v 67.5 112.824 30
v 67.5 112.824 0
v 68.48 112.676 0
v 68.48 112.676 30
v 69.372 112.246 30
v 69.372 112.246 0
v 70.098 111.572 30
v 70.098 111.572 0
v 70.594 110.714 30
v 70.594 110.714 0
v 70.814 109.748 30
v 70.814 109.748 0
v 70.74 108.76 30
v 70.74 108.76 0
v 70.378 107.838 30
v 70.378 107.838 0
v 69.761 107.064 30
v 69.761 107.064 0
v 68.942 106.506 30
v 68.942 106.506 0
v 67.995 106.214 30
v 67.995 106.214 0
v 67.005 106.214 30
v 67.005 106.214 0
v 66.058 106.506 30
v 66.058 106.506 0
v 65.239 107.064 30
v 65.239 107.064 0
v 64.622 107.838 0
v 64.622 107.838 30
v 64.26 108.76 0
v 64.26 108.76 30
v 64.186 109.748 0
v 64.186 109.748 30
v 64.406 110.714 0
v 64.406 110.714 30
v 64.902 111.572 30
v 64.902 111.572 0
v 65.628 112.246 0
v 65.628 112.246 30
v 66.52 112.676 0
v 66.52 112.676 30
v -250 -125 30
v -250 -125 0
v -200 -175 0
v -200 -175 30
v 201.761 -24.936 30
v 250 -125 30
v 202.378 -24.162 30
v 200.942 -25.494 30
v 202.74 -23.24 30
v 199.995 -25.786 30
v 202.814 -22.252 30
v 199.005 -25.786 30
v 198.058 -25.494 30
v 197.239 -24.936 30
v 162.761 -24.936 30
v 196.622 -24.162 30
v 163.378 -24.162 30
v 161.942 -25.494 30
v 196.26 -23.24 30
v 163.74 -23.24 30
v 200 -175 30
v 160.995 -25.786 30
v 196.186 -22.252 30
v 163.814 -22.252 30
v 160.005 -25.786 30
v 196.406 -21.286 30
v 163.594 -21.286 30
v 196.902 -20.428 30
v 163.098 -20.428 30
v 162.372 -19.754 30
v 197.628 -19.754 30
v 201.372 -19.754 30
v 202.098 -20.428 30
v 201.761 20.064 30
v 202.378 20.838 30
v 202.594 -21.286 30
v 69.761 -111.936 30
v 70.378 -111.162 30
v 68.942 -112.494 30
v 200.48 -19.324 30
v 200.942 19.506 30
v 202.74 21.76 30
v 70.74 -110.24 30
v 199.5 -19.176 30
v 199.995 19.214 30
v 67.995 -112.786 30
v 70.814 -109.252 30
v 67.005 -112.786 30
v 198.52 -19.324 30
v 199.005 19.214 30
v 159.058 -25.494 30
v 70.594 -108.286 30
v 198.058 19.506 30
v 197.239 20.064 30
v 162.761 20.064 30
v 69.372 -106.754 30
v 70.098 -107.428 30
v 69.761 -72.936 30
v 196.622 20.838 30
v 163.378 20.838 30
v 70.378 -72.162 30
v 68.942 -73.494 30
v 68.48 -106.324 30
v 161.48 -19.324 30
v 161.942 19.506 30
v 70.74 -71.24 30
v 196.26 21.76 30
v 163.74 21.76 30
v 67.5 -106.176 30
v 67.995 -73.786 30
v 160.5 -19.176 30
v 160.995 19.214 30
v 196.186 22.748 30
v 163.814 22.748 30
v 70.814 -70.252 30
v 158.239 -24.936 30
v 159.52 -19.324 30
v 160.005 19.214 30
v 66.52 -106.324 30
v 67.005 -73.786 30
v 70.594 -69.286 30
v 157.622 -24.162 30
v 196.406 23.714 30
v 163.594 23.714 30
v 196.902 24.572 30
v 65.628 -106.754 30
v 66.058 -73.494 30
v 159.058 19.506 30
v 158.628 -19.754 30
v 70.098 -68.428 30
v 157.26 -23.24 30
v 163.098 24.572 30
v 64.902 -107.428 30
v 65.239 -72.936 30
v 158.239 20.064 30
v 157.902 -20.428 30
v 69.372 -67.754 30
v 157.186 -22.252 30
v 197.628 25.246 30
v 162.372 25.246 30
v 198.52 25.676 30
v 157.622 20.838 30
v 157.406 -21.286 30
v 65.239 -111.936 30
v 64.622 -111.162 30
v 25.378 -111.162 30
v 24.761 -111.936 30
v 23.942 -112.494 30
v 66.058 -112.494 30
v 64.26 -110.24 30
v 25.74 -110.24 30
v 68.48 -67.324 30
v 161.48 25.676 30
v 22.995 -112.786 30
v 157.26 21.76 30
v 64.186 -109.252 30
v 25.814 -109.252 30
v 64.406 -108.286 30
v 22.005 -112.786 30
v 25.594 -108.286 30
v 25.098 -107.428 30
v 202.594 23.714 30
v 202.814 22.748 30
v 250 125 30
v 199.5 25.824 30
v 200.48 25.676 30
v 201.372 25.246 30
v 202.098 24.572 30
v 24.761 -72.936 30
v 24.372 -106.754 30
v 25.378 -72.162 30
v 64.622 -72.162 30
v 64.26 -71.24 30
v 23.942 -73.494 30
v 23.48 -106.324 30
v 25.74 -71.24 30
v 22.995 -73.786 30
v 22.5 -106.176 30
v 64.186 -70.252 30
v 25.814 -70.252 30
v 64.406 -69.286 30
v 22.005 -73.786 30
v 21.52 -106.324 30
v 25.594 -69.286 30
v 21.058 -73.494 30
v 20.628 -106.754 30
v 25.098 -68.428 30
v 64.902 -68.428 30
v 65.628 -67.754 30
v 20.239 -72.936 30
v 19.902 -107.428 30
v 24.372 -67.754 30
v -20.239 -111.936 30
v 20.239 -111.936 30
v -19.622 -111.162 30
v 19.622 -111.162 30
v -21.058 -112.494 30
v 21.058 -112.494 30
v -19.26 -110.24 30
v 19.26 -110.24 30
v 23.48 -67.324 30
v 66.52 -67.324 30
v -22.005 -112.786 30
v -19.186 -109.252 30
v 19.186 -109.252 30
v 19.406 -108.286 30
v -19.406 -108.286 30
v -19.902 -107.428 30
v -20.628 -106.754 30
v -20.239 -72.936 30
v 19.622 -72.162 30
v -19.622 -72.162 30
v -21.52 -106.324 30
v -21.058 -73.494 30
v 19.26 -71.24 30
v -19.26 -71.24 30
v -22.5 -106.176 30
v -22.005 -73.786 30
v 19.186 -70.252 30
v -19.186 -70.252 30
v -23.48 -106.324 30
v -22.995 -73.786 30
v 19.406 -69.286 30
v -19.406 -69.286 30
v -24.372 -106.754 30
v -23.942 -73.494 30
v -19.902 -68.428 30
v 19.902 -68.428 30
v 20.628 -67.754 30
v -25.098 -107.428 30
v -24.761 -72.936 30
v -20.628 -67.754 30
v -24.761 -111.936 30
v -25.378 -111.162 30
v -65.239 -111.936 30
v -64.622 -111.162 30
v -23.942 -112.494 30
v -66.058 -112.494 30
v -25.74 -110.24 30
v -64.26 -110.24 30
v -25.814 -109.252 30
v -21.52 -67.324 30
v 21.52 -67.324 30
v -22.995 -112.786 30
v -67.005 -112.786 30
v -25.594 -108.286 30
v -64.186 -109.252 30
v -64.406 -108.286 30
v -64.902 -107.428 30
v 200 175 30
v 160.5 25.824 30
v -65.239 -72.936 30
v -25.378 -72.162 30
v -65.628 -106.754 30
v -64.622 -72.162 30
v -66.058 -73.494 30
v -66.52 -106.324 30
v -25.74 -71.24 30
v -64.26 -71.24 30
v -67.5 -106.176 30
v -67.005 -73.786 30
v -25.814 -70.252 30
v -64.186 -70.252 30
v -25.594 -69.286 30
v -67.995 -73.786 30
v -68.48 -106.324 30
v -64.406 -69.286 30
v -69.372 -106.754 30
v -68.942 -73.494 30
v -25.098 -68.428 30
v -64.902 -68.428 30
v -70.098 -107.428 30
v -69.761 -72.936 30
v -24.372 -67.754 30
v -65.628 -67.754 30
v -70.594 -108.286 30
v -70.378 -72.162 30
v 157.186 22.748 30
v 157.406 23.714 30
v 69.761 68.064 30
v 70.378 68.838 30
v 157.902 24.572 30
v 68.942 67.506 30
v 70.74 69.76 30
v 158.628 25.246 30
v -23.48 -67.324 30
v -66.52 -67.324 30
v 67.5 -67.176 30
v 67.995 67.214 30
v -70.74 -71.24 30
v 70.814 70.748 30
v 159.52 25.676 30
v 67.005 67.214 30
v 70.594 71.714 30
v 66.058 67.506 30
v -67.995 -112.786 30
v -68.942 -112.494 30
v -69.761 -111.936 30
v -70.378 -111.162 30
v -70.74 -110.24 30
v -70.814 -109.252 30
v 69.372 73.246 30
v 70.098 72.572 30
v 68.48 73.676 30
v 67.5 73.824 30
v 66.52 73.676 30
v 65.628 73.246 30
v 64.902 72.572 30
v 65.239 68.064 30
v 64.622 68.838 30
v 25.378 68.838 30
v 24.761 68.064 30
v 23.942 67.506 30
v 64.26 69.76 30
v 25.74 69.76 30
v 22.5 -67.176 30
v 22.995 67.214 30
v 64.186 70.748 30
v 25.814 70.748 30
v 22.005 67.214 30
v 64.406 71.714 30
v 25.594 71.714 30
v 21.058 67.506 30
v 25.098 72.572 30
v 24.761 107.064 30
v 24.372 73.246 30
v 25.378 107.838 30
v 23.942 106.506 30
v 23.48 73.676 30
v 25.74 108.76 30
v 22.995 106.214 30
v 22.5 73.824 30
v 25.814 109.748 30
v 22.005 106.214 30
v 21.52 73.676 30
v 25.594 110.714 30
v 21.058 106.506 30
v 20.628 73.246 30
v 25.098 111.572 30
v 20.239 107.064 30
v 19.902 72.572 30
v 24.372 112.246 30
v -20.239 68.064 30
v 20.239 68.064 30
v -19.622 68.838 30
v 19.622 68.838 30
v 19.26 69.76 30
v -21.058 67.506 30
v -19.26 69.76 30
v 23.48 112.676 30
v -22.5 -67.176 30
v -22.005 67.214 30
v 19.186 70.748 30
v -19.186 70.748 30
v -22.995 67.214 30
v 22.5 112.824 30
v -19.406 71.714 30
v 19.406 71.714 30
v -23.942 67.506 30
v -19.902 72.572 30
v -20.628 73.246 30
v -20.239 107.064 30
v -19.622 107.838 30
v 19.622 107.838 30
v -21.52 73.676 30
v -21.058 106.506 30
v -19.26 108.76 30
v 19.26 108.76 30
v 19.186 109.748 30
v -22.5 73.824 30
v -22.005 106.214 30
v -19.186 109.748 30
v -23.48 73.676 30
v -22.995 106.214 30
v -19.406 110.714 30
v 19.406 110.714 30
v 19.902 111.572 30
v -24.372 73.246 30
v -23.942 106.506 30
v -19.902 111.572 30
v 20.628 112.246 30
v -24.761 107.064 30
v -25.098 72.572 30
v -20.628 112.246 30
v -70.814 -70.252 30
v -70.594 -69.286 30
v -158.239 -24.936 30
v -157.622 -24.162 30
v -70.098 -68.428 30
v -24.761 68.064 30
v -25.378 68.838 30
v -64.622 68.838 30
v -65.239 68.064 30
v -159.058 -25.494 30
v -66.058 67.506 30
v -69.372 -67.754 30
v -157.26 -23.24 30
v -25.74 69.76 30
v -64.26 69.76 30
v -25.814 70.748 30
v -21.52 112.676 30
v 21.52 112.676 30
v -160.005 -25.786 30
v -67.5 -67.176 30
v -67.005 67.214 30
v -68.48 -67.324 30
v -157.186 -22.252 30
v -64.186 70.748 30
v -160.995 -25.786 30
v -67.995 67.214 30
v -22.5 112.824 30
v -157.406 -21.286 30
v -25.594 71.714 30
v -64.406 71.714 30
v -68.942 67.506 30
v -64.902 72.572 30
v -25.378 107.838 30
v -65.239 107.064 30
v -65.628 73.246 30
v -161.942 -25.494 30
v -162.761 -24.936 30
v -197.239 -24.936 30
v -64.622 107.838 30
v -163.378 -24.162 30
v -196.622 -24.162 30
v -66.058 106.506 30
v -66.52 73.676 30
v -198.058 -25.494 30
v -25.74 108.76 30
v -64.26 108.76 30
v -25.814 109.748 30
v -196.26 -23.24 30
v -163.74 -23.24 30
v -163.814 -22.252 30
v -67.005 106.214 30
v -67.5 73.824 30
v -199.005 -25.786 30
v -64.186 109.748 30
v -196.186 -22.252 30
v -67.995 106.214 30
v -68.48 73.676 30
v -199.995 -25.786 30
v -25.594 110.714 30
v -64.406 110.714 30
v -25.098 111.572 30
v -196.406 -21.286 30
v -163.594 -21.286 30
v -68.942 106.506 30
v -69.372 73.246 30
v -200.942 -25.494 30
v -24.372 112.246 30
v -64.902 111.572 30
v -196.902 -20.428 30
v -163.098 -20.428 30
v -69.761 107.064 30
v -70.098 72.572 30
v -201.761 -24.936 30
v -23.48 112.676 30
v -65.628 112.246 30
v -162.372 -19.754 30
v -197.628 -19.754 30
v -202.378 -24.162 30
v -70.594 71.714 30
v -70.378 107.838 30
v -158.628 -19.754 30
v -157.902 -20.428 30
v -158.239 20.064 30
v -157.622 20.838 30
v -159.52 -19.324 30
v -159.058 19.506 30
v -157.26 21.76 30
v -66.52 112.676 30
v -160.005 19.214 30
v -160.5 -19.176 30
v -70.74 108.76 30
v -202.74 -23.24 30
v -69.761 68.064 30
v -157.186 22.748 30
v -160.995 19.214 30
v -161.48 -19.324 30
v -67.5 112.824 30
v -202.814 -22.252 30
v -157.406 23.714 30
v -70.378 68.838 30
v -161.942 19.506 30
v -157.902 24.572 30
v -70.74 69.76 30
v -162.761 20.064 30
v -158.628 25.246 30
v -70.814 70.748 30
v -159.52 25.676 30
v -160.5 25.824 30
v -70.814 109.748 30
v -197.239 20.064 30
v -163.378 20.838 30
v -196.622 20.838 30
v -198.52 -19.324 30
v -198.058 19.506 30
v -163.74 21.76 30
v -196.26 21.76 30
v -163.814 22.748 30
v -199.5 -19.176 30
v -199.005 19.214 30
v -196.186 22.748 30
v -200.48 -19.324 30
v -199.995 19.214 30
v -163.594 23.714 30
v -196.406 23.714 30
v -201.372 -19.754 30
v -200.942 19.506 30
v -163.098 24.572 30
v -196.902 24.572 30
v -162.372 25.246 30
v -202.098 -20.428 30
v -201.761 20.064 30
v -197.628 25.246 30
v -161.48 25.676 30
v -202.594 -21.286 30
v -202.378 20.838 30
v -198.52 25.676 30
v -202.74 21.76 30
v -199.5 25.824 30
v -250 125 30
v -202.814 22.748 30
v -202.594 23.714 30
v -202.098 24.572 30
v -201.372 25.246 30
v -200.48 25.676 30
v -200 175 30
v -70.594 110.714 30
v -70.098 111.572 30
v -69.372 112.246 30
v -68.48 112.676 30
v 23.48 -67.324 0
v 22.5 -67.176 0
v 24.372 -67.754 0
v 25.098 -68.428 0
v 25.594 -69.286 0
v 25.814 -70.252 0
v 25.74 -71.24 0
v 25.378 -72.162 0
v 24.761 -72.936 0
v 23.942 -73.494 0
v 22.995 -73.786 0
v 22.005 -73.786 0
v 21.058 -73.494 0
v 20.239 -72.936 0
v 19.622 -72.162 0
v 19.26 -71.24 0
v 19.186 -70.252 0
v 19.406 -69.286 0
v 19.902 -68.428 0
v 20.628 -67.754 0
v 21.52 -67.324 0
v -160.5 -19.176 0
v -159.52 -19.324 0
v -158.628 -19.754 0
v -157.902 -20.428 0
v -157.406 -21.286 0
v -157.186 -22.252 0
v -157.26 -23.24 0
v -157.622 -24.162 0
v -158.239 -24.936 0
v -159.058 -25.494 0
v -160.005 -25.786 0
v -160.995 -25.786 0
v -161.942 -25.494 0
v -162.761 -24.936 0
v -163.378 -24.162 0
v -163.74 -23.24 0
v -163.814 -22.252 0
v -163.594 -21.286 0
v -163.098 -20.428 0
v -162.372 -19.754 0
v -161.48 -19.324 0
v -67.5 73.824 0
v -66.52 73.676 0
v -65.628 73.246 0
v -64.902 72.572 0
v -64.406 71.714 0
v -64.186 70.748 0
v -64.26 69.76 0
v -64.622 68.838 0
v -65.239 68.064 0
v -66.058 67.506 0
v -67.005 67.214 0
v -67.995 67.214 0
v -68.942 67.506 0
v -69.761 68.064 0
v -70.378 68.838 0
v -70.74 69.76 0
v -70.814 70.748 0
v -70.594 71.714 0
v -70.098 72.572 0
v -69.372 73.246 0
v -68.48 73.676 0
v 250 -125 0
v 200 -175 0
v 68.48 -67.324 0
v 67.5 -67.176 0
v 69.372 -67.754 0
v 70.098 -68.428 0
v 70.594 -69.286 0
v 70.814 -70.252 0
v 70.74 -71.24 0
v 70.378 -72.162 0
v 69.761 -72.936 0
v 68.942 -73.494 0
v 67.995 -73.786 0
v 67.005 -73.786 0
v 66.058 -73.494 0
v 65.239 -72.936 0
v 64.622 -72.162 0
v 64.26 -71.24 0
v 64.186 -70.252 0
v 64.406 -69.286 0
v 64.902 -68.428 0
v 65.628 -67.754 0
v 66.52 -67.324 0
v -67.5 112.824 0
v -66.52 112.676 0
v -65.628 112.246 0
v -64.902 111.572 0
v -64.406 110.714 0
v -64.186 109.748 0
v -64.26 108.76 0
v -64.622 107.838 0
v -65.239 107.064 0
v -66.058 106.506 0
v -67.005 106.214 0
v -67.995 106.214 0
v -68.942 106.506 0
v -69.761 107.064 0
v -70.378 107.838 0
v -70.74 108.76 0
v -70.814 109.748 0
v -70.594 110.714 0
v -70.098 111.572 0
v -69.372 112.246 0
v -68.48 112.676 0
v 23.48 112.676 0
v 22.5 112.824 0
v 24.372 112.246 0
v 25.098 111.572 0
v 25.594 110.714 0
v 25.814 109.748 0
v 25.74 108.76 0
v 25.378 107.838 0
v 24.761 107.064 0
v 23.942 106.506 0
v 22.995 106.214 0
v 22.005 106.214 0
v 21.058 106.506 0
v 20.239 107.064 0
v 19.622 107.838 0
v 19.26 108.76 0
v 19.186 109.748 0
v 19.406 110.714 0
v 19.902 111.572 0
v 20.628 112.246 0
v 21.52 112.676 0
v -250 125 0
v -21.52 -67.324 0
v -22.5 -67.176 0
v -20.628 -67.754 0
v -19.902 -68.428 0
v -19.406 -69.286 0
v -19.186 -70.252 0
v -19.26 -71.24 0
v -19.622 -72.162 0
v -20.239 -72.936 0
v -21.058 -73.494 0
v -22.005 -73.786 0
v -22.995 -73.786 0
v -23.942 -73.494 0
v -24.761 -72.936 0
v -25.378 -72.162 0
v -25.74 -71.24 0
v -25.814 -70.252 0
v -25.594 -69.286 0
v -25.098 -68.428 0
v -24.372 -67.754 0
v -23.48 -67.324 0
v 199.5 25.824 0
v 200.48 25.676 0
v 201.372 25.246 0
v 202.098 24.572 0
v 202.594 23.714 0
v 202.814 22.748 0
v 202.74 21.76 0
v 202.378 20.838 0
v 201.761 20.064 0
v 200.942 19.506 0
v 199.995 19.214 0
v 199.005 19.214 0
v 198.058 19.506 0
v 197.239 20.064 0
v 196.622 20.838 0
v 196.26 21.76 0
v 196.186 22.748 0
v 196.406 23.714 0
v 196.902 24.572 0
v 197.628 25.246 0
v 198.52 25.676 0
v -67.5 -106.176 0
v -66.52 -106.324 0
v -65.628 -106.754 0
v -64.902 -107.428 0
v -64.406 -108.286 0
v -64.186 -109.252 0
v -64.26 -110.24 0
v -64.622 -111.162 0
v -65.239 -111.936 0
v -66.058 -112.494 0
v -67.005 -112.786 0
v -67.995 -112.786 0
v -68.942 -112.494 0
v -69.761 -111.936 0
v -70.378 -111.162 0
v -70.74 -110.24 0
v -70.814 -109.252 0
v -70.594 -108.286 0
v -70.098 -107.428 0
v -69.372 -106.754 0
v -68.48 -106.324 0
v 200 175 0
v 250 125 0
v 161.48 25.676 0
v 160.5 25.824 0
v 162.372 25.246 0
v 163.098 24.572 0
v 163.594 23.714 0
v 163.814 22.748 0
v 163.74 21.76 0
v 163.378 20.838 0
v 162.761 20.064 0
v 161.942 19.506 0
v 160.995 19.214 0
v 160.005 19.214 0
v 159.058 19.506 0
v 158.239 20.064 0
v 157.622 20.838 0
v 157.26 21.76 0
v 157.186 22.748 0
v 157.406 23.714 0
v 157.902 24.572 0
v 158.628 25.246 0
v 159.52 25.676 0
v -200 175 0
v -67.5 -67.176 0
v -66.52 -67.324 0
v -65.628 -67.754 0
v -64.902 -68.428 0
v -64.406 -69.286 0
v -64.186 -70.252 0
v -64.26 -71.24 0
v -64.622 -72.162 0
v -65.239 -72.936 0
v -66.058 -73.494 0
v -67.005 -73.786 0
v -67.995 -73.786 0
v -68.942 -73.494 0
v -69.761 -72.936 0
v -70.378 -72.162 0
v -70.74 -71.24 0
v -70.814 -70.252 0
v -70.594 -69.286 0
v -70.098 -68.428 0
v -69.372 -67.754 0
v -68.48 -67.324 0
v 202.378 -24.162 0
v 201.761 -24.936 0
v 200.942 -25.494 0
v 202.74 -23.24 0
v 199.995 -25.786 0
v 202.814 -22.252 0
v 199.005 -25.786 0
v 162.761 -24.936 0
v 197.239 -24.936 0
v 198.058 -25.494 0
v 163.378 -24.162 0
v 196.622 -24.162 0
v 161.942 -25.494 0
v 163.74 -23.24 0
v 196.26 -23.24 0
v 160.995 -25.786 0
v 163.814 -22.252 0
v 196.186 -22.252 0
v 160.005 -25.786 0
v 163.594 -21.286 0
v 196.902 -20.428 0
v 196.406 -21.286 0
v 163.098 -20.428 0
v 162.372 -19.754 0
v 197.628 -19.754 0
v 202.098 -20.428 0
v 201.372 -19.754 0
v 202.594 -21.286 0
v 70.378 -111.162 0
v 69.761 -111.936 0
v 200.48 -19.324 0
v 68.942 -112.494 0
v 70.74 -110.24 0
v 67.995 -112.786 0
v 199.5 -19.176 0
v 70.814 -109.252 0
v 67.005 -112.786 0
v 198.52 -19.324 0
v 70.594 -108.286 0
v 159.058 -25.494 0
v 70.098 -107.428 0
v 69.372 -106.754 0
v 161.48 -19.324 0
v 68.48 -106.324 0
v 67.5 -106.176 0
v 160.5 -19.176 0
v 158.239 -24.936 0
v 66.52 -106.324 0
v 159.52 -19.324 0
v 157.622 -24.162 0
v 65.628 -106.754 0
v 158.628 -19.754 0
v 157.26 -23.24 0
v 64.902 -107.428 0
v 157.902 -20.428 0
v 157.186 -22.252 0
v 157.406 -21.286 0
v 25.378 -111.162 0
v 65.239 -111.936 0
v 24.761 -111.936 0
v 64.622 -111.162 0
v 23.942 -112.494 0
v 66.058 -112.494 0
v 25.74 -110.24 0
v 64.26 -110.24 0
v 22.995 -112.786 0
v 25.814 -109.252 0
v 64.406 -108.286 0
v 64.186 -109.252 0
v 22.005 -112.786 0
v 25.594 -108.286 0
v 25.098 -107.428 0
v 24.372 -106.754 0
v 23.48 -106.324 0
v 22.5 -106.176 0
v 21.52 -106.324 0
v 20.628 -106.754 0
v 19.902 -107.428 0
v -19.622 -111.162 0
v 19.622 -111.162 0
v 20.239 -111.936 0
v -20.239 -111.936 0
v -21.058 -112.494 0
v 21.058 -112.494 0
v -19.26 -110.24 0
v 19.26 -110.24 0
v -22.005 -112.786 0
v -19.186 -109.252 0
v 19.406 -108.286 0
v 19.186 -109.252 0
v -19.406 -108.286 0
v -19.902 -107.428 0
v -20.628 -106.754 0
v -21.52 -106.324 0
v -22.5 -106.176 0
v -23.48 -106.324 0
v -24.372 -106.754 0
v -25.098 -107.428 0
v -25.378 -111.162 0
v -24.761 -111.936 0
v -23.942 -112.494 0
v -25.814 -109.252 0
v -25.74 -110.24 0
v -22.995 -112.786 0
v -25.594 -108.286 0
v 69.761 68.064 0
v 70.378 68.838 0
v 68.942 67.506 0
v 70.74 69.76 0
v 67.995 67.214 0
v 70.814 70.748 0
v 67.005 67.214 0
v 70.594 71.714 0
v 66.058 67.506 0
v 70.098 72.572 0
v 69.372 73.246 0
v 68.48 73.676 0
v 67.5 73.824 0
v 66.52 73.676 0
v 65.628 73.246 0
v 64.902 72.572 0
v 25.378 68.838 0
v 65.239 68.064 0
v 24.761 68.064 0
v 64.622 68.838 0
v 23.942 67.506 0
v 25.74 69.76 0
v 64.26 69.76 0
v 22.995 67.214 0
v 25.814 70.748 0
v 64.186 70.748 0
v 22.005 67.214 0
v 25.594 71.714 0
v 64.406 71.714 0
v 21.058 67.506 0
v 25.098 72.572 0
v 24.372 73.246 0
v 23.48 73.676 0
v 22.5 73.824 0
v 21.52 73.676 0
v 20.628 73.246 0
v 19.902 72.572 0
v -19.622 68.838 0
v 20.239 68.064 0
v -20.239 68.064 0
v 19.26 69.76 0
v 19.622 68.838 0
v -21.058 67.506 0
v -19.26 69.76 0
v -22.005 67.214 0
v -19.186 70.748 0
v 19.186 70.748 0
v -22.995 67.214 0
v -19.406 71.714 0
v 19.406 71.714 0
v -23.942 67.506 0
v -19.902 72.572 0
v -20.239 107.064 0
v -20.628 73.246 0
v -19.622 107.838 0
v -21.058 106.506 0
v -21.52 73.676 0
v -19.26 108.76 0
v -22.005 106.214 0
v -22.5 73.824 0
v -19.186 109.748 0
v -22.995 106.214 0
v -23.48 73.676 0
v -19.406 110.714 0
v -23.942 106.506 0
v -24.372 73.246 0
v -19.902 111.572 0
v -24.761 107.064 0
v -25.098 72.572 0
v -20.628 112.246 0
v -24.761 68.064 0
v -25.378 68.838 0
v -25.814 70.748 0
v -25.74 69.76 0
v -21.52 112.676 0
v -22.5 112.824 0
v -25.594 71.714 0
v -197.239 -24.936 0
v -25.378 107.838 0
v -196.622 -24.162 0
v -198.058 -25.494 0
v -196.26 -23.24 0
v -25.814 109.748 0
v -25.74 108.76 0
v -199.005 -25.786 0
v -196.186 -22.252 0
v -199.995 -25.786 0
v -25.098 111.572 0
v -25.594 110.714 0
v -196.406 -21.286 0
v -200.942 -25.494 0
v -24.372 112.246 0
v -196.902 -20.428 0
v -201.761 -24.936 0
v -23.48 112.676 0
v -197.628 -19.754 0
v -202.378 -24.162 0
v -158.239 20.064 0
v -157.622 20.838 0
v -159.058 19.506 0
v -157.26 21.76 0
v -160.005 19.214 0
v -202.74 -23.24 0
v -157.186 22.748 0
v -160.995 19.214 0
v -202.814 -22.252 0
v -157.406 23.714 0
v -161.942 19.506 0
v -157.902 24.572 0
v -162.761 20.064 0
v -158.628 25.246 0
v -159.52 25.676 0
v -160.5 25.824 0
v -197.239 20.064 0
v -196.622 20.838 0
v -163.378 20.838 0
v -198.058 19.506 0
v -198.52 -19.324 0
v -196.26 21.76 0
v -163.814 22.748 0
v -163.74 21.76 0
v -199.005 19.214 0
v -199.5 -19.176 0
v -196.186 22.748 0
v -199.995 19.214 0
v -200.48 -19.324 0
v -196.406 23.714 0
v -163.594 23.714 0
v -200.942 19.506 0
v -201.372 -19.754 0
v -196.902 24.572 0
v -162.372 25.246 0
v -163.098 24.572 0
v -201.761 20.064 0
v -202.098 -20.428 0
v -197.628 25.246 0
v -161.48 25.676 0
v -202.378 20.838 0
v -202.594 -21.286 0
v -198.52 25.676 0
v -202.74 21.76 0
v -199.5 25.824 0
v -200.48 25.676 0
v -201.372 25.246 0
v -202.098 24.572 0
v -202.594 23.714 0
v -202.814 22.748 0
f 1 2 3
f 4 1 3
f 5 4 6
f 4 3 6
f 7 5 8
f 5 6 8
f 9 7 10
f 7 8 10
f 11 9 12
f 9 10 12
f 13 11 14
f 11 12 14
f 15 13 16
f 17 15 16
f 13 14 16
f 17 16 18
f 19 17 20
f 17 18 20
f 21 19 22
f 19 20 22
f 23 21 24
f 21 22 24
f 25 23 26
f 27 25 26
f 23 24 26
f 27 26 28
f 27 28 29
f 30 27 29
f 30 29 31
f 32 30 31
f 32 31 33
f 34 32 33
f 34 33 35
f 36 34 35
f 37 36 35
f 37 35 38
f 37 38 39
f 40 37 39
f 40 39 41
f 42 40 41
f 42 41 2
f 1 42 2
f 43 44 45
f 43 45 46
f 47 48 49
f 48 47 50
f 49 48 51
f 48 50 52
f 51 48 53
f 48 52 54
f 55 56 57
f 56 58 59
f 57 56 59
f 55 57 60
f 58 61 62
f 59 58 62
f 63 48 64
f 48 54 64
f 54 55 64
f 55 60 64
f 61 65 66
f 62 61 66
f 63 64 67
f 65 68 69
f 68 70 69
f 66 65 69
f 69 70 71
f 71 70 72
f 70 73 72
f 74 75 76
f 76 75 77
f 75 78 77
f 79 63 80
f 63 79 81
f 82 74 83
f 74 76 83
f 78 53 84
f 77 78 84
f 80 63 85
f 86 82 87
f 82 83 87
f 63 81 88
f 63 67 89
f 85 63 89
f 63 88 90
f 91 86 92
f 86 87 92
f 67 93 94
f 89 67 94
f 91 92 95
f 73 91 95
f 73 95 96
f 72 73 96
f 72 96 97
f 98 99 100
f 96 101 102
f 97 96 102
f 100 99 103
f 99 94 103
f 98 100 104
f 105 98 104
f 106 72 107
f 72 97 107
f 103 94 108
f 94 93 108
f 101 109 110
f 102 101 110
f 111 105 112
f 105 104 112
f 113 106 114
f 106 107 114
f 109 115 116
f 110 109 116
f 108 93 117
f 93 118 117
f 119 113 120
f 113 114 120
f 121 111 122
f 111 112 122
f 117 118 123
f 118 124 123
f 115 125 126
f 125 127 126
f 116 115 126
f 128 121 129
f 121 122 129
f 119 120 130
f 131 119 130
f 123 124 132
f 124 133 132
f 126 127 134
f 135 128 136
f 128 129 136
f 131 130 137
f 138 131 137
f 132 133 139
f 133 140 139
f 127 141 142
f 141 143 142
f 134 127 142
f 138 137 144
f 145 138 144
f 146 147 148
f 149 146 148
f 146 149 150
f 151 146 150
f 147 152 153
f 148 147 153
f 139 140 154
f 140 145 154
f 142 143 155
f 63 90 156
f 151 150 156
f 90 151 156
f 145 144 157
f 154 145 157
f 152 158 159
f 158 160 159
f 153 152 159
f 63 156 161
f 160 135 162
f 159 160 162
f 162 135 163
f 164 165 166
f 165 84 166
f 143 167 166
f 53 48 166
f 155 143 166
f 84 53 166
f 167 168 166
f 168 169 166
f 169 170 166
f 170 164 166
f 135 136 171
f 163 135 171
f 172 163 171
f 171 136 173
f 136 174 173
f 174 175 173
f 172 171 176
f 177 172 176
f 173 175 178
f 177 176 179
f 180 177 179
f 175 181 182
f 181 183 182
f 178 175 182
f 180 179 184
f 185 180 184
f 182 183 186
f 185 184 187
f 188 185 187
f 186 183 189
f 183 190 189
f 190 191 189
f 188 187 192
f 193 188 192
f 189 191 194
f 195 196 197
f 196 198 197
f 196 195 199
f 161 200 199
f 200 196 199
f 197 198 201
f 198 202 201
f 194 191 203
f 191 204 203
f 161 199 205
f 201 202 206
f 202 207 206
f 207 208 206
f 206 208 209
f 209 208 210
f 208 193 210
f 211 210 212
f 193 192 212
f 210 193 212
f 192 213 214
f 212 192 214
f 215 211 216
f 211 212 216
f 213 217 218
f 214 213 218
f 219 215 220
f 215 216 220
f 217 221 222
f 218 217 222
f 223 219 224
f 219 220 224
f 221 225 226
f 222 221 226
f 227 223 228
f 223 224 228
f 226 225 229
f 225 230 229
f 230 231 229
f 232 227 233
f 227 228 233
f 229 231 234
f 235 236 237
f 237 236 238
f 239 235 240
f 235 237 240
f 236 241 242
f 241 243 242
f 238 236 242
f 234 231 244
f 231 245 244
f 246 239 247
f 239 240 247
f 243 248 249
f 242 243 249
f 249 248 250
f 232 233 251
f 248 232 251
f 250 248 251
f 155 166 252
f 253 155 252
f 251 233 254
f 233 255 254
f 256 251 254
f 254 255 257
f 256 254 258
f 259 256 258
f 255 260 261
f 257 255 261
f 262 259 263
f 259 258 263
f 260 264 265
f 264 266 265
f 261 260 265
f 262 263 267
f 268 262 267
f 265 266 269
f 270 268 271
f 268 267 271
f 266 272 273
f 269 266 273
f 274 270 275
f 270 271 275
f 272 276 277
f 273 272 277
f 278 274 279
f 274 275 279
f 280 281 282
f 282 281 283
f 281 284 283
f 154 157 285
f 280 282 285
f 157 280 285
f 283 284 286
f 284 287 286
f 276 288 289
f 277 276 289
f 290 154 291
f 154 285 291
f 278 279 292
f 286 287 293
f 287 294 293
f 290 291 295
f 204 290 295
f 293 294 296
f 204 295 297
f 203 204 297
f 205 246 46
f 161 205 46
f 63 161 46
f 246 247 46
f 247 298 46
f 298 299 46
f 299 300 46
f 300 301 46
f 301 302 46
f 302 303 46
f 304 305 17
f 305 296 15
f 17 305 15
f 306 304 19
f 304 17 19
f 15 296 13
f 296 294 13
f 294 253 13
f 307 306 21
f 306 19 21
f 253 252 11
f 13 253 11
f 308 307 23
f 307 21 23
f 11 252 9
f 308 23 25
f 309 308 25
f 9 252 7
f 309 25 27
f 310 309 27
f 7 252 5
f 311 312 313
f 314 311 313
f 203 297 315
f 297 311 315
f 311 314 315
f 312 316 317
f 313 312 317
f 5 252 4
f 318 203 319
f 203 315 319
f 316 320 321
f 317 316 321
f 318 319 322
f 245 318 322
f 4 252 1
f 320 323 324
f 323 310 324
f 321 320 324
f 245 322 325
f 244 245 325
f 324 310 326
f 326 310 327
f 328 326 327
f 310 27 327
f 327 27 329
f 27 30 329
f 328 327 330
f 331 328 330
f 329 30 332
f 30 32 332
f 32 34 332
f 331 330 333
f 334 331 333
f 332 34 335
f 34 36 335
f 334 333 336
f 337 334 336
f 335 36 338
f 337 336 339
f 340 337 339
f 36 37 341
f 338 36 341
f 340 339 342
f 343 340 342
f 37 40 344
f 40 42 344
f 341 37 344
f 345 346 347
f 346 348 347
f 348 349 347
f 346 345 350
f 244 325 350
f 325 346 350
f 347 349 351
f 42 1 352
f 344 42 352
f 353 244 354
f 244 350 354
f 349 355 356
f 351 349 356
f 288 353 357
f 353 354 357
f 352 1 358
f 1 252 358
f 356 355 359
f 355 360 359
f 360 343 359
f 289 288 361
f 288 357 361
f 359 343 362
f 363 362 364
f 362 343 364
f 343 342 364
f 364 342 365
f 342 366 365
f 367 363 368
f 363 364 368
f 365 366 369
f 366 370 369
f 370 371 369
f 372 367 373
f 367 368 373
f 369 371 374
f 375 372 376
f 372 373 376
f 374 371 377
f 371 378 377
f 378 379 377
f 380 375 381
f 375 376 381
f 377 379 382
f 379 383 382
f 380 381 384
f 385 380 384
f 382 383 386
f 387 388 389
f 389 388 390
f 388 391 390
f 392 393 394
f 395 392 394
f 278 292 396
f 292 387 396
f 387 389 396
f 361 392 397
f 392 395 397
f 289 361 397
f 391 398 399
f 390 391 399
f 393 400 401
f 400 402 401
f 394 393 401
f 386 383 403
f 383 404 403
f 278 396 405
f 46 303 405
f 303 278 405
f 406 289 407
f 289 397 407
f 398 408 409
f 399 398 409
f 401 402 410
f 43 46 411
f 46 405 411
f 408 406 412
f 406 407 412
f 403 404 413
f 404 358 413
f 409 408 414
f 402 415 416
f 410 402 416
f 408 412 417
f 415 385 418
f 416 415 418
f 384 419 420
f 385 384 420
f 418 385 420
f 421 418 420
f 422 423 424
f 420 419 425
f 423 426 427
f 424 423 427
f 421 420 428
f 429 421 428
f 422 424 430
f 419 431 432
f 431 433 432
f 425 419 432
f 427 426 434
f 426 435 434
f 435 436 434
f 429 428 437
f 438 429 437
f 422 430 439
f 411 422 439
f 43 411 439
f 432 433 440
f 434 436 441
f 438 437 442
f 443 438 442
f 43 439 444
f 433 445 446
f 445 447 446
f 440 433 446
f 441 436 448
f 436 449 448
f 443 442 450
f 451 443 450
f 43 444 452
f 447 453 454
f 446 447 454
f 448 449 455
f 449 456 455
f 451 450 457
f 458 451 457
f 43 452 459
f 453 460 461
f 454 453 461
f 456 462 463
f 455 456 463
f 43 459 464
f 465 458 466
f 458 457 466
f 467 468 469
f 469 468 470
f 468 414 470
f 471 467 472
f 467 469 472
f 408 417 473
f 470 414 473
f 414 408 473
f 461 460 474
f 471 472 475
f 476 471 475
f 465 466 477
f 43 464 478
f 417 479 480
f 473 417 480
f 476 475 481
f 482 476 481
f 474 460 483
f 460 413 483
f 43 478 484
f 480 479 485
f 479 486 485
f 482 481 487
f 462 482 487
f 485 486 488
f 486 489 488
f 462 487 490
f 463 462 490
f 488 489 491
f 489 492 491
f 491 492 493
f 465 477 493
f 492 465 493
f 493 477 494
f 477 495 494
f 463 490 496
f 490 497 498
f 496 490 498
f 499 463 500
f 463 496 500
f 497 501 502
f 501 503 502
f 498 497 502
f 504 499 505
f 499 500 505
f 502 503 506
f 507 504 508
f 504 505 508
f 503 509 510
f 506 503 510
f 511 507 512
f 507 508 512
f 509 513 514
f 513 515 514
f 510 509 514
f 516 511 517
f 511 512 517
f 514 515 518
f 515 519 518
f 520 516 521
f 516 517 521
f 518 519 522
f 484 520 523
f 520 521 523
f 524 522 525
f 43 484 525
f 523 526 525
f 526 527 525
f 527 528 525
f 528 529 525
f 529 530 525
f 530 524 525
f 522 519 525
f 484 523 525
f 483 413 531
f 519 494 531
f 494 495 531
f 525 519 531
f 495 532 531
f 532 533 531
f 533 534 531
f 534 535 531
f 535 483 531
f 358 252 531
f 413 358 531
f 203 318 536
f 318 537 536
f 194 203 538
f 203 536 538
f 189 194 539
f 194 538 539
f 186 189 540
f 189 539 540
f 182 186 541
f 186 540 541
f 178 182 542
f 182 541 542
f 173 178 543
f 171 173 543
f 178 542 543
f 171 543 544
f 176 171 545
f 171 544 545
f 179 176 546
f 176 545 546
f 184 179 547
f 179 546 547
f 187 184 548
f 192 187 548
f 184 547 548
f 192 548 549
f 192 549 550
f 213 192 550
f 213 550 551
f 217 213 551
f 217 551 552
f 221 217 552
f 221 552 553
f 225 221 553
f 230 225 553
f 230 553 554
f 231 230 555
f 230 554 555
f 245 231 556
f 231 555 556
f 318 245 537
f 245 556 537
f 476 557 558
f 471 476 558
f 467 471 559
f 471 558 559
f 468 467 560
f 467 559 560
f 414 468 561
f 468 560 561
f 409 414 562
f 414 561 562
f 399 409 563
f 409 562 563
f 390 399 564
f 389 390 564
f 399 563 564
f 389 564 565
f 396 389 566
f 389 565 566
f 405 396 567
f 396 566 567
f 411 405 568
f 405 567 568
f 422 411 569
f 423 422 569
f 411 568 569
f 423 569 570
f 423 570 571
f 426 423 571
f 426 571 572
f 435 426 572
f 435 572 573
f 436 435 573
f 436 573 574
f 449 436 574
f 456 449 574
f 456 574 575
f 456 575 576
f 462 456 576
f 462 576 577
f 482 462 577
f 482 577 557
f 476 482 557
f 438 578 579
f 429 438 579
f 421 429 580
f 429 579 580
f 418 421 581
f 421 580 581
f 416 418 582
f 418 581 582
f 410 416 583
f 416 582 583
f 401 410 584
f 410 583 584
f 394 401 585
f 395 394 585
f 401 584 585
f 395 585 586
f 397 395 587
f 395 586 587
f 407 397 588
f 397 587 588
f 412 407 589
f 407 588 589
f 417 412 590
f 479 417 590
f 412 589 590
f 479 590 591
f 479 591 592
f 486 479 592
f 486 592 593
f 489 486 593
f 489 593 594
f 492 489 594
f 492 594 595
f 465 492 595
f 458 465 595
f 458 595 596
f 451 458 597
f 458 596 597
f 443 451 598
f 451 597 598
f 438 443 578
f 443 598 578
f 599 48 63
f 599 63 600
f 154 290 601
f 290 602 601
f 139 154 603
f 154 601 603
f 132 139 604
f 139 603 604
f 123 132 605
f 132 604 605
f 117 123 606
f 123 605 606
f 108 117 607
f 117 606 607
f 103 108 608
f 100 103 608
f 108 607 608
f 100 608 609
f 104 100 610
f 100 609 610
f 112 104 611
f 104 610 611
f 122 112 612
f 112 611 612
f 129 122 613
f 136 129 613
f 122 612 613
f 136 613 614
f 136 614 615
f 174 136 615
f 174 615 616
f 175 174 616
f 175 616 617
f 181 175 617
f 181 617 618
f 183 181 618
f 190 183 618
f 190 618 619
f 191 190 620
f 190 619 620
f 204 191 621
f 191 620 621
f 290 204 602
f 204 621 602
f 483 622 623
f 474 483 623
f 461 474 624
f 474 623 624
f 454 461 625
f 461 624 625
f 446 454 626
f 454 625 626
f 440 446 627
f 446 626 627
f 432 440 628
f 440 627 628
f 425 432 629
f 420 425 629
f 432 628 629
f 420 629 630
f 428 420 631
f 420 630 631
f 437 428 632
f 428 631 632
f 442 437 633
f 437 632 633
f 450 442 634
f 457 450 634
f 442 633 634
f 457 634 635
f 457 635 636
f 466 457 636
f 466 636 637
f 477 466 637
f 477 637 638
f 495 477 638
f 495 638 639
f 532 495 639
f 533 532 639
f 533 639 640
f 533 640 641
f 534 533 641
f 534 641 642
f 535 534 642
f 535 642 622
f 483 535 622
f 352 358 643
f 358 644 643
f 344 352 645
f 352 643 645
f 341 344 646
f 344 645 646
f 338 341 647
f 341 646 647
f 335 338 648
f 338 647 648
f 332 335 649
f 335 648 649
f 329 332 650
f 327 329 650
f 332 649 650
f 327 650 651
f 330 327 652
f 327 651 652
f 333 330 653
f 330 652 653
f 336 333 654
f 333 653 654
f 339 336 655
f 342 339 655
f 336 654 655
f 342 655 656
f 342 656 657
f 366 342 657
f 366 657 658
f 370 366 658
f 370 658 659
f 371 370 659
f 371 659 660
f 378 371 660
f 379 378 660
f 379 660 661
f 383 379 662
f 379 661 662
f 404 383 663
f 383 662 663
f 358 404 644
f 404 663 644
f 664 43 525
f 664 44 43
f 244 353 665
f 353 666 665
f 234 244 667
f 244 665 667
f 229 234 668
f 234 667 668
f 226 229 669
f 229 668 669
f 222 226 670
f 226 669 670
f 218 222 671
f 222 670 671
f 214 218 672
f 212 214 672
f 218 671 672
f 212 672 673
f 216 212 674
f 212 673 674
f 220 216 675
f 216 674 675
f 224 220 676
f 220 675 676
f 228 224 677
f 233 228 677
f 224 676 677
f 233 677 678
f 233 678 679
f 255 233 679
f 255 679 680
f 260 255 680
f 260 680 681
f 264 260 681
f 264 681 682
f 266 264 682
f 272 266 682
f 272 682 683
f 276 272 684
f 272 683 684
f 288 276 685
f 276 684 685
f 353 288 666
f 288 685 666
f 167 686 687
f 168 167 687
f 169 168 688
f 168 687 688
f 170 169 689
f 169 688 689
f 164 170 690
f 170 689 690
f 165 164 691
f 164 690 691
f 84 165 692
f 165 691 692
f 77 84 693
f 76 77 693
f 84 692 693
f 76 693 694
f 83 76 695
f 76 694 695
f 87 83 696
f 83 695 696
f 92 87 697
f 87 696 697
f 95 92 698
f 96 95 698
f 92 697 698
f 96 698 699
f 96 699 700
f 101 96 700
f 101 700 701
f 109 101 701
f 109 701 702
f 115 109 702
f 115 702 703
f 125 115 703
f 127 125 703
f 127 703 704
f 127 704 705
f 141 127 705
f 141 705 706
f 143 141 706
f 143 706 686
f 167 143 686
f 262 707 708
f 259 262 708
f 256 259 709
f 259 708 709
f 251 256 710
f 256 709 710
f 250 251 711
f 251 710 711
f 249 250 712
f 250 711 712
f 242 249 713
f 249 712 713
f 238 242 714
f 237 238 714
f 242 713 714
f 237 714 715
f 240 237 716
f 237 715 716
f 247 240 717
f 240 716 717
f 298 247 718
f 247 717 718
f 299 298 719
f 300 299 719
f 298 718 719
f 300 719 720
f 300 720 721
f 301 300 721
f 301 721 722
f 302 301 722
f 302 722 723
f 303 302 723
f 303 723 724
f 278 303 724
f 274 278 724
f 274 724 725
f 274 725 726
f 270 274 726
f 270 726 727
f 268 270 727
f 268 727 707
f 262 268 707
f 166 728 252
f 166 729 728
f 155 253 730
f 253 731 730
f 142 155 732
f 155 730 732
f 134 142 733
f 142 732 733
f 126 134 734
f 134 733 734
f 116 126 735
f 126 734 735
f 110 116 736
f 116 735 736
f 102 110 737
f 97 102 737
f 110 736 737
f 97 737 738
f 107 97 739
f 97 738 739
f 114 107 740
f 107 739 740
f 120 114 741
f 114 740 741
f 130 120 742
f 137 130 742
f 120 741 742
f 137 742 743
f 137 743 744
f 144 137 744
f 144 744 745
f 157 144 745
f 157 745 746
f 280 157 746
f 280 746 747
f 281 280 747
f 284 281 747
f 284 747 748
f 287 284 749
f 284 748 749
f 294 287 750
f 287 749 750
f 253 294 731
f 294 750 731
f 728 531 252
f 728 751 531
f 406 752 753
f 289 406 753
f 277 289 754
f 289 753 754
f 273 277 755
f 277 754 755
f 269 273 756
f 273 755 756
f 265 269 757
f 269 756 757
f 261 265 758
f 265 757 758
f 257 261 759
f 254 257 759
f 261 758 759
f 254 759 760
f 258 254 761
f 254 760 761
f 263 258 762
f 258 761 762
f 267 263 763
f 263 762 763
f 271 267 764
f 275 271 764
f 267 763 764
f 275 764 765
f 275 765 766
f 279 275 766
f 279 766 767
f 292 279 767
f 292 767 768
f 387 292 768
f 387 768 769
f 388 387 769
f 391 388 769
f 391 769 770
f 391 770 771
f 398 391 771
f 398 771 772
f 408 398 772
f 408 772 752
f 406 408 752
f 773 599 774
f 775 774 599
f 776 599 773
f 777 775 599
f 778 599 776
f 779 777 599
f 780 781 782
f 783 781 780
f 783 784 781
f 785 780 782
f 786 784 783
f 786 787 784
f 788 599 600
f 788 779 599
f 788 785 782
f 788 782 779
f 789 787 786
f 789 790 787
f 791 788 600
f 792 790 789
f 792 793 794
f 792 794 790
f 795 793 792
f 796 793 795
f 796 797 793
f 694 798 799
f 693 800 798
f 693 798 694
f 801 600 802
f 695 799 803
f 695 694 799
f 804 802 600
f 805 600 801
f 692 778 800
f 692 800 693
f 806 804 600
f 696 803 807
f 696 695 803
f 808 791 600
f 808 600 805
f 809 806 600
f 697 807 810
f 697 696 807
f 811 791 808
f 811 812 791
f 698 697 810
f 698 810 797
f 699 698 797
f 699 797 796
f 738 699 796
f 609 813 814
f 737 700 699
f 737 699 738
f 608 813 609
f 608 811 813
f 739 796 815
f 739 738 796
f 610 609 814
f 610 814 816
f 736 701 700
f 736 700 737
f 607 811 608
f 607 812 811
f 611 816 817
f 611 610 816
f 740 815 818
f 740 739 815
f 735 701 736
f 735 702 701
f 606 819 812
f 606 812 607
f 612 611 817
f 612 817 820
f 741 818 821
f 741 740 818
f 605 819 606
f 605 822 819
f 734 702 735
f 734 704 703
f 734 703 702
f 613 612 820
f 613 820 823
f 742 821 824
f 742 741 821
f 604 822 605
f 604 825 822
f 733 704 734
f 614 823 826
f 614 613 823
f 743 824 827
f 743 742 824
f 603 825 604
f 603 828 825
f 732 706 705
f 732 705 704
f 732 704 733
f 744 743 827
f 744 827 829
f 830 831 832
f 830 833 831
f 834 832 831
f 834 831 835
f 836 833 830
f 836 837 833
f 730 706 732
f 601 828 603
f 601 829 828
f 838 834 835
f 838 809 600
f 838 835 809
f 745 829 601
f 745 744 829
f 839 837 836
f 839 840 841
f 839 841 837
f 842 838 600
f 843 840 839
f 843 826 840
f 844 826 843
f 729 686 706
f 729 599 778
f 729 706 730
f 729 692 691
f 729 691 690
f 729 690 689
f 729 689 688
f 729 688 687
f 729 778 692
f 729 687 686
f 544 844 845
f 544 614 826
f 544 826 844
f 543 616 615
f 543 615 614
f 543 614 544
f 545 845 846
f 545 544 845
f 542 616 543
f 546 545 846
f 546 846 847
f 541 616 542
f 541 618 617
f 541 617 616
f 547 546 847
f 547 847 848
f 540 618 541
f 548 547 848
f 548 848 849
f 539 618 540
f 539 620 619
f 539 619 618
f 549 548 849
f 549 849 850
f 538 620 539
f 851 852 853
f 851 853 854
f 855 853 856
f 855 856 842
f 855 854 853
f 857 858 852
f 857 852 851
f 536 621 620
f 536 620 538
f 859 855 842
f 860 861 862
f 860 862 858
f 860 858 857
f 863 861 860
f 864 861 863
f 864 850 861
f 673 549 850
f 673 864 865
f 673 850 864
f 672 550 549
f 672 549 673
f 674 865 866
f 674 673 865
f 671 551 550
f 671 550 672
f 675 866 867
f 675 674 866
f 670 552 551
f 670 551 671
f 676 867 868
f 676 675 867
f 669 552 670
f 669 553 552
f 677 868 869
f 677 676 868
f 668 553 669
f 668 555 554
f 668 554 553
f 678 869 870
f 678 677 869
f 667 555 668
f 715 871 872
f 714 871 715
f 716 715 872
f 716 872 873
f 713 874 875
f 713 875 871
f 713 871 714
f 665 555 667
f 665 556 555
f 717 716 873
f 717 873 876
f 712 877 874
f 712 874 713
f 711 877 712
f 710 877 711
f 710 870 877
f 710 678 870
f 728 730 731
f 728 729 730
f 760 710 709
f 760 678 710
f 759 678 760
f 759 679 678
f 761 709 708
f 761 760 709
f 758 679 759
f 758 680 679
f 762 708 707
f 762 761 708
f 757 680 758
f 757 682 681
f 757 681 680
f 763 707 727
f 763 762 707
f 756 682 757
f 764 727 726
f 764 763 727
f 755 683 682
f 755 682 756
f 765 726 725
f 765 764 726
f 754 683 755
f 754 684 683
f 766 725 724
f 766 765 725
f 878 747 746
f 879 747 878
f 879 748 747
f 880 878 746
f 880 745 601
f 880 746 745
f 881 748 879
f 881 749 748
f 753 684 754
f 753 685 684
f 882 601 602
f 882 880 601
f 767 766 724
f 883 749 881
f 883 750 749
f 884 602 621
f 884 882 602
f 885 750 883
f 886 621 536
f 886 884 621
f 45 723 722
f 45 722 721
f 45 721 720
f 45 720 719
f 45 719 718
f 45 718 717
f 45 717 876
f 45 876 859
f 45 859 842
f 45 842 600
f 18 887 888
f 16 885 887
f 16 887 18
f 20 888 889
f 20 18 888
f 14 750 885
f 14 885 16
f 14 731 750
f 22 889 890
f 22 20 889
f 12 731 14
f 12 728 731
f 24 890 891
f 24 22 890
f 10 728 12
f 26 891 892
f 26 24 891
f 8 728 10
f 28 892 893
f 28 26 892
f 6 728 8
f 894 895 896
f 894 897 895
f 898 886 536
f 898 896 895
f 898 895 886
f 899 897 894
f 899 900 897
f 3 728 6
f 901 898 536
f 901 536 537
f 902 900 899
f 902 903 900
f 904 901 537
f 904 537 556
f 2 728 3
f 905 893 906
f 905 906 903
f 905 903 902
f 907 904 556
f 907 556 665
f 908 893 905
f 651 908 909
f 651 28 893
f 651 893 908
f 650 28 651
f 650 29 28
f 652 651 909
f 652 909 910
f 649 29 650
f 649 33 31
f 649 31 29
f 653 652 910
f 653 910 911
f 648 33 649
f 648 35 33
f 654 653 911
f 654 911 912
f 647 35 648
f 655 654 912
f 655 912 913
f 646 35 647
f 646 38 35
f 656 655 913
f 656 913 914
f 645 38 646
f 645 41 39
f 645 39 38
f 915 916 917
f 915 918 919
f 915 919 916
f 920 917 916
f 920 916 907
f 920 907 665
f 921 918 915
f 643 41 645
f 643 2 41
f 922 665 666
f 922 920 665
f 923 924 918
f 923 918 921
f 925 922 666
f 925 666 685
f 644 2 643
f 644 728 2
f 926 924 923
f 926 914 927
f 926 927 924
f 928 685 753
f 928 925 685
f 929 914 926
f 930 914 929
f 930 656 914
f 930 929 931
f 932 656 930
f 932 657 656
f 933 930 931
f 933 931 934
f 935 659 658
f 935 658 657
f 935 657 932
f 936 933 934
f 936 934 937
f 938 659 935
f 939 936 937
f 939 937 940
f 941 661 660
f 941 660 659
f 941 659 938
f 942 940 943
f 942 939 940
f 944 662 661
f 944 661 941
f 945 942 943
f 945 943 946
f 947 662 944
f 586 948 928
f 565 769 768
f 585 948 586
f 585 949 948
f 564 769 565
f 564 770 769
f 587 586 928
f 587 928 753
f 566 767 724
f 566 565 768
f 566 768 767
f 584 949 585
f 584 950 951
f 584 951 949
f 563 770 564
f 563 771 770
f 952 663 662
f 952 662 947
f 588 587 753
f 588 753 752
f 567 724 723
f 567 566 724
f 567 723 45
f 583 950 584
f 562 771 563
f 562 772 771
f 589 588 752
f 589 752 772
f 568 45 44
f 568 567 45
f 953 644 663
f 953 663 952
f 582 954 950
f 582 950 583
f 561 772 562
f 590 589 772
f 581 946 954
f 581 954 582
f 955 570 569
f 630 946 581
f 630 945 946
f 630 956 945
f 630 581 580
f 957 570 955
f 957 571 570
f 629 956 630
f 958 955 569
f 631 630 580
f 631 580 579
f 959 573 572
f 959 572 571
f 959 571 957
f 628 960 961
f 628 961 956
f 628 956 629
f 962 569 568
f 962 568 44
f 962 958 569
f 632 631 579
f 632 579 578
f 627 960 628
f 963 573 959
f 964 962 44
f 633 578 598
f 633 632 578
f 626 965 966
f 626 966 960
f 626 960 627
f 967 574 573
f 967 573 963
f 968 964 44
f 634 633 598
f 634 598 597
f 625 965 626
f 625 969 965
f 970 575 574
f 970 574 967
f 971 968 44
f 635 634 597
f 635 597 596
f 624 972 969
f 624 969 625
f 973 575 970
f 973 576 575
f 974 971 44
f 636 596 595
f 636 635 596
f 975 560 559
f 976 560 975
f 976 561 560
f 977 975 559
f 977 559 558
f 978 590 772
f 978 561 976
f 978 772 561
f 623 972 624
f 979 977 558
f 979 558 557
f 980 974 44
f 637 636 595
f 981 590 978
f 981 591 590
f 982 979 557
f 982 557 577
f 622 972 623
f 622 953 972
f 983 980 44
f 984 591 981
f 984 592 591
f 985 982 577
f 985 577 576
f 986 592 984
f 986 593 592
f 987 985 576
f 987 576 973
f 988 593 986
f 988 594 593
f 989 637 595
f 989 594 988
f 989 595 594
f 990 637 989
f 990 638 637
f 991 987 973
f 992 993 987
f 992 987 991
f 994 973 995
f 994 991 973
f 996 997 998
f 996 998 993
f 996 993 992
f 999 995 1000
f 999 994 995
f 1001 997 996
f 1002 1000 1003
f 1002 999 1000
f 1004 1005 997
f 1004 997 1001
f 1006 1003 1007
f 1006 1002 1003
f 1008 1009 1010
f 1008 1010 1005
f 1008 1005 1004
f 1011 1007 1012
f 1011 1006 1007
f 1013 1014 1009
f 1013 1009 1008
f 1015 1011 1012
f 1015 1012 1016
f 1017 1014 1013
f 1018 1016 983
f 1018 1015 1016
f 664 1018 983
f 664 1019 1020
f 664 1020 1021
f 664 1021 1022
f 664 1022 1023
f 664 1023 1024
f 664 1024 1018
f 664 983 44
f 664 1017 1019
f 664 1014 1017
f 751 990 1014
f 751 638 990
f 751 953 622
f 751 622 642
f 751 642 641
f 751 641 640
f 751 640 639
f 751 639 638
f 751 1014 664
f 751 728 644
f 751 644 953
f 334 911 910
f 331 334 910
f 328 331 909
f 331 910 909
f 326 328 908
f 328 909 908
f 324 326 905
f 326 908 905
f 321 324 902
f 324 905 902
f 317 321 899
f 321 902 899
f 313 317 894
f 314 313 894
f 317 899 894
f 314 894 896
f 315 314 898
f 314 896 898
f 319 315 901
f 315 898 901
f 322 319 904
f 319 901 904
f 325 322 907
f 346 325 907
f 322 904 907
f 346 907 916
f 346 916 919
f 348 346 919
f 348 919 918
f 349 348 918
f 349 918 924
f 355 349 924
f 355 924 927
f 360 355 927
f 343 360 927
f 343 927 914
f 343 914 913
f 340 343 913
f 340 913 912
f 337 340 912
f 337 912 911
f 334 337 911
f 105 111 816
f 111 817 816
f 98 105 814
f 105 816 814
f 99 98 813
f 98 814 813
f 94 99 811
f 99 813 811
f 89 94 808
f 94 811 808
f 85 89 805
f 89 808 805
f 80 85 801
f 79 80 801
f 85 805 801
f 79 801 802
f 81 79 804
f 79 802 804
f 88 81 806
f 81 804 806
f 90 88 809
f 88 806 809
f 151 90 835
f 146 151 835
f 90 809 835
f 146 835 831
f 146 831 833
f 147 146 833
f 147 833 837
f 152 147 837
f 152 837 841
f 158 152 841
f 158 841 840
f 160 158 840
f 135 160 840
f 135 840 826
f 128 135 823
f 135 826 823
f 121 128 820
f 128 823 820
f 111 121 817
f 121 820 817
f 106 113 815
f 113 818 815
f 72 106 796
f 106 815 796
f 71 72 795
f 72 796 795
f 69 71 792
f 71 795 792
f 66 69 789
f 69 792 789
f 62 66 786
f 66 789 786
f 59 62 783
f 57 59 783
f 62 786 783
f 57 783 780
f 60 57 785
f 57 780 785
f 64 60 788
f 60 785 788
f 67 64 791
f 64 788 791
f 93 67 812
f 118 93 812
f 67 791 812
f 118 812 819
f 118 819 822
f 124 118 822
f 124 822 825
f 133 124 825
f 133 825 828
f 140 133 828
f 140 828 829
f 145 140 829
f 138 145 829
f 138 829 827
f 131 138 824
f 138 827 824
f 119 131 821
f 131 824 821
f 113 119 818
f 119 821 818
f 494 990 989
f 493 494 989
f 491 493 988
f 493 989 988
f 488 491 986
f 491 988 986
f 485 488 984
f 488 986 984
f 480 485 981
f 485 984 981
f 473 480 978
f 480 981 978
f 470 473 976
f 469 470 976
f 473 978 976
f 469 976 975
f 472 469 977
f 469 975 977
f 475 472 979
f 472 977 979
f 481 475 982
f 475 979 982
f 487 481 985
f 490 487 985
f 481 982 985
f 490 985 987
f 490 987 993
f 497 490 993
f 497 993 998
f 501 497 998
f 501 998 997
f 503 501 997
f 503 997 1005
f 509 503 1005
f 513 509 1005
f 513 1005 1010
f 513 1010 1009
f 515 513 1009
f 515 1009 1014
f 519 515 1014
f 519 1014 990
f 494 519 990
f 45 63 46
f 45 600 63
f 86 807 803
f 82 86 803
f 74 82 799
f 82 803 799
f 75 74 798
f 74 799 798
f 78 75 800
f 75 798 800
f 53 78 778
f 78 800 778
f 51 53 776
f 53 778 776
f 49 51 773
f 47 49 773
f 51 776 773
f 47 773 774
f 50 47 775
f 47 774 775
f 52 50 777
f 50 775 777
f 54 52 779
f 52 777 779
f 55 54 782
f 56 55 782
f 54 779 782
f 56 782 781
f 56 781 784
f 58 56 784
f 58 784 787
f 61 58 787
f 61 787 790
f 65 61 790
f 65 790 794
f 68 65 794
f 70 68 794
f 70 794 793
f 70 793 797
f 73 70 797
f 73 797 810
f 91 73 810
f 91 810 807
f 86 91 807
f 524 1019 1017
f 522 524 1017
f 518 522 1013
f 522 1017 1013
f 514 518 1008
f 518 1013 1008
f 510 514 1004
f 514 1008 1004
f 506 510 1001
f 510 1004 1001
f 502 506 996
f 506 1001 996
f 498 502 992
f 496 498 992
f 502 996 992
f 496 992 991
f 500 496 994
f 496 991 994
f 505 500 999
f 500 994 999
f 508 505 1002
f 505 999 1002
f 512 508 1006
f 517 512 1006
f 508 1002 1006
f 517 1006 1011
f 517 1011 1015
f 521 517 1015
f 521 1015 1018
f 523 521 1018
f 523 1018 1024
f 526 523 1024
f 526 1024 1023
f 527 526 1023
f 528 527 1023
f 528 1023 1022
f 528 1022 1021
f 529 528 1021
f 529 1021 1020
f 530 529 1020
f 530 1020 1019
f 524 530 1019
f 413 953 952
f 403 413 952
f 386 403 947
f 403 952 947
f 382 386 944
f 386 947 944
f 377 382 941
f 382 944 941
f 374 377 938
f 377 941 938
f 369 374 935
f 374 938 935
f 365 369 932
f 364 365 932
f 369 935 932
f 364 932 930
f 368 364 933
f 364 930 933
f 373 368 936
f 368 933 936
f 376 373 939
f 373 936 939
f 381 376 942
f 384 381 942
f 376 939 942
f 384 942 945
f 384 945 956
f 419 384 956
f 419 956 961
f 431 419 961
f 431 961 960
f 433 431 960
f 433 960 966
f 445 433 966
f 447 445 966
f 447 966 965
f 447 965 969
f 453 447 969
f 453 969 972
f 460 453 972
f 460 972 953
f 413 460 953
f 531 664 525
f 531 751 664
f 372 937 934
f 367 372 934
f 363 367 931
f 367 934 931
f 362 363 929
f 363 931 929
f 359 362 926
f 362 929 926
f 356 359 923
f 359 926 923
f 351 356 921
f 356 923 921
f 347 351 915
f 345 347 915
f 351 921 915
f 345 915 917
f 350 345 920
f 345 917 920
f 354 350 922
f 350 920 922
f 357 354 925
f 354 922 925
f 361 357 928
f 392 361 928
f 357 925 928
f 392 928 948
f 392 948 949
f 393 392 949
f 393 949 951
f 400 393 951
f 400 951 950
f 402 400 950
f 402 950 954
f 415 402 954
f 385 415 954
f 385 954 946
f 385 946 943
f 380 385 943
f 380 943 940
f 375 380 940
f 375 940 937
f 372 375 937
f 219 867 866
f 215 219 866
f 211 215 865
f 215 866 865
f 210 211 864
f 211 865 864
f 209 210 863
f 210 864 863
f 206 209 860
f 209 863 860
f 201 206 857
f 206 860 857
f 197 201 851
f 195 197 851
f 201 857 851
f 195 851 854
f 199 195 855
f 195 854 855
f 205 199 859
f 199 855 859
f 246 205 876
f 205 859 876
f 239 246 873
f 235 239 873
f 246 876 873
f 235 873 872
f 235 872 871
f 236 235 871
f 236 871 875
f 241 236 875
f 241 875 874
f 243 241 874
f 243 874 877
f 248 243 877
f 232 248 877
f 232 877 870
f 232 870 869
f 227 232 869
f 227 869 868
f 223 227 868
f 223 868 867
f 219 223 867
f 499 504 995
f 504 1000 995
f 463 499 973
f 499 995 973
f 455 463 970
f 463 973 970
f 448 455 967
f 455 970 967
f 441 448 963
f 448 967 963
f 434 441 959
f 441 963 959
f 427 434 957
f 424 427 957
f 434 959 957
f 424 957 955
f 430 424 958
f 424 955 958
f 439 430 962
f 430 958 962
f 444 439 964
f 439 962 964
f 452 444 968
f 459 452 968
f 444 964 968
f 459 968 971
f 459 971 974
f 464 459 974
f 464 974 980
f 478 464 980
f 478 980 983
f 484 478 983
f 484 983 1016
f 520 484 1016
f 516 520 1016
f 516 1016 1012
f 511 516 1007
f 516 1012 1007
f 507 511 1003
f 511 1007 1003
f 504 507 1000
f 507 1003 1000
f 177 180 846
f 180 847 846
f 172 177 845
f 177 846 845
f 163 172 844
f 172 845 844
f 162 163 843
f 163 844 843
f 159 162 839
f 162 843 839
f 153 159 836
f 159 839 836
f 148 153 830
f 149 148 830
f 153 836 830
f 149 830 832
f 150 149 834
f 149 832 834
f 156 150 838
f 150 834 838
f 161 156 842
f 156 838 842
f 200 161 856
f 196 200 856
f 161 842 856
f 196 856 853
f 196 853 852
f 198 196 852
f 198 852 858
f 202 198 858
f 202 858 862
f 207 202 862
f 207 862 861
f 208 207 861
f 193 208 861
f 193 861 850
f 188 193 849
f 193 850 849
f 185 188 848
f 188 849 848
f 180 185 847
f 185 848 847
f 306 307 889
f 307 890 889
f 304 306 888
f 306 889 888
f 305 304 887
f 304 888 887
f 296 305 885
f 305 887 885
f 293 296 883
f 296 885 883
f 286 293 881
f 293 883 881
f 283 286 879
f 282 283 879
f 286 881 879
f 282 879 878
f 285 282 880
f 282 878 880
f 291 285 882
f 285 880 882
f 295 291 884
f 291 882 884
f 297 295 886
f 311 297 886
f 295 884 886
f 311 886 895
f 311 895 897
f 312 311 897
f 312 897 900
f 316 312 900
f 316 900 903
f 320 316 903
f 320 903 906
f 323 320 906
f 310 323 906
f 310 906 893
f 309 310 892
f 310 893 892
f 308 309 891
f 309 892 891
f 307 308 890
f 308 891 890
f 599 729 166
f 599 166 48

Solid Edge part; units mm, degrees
sketch "Sketch1" plane through (0, 0, 0) normal (0, 0, 1) x (1, 0, 0)
  line L0 (250, -175) -> (-250, -175)
  line L1 (-250, -175) -> (-250, 175)
  line L2 (-250, 175) -> (250, 175)
  line L3 (250, 175) -> (250, -175)
extrude "Protrusion1" add sketch "Sketch1" along normal blind 30
chamfer "Chaflán_1" distance 50 angle 45 4 edges at (250, -175, 15) (-250, -175, 15) (250, 175, 15) (-250, 175, 15)
hole "Agujero_1" at (199.5, 22.5, 0) direction (0, 0, 1) diameter 6.647 end through all thread major 8 thread length 15
hole "Hole1" at (160.5, 22.5, 0) direction (0, 0, 1) diameter 6.647 end through all thread major 8 thread length 15
hole "Hole2" at (199.5, -22.5, 0) direction (0, 0, 1) diameter 6.647 end through all thread major 8 thread length 15
hole "Hole3" at (160.5, -22.5, 0) direction (0, 0, 1) diameter 6.647 end through all thread major 8 thread length 15
hole "Hole4" at (67.5, 109.5, 0) direction (0, 0, 1) diameter 6.647 end through all thread major 8 thread length 15
hole "Hole5" at (22.5, 109.5, 0) direction (0, 0, 1) diameter 6.647 end through all thread major 8 thread length 15
hole "Hole6" at (67.5, 70.5, 0) direction (0, 0, 1) diameter 6.647 end through all thread major 8 thread length 15
hole "Hole7" at (22.5, 70.5, 0) direction (0, 0, 1) diameter 6.647 end through all thread major 8 thread length 15
hole "Hole8" at (-22.5, 70.5, 0) direction (0, 0, 1) diameter 6.647 end through all thread major 8 thread length 15
hole "Hole9" at (-22.5, 109.5, 0) direction (0, 0, 1) diameter 6.647 end through all thread major 8 thread length 15
hole "Hole10" at (-67.5, 109.5, 0) direction (0, 0, 1) diameter 6.647 end through all thread major 8 thread length 15
hole "Hole11" at (-67.5, 70.5, 0) direction (0, 0, 1) diameter 6.647 end through all thread major 8 thread length 15
hole "Hole12" at (-160.5, 22.5, 0) direction (0, 0, 1) diameter 6.647 end through all thread major 8 thread length 15
hole "Hole13" at (-199.5, 22.5, 0) direction (0, 0, 1) diameter 6.647 end through all thread major 8 thread length 15
hole "Hole14" at (-160.5, -22.5, 0) direction (0, 0, 1) diameter 6.647 end through all thread major 8 thread length 15
hole "Hole15" at (-199.5, -22.5, 0) direction (0, 0, 1) diameter 6.647 end through all thread major 8 thread length 15
hole "Hole16" at (-67.5, -70.5, 0) direction (0, 0, 1) diameter 6.647 end through all thread major 8 thread length 15
hole "Hole17" at (-22.5, -70.5, 0) direction (0, 0, 1) diameter 6.647 end through all thread major 8 thread length 15
hole "Hole18" at (-22.5, -109.5, 0) direction (0, 0, 1) diameter 6.647 end through all thread major 8 thread length 15
hole "Hole19" at (-67.5, -109.5, 0) direction (0, 0, 1) diameter 6.647 end through all thread major 8 thread length 15
hole "Hole20" at (22.5, -109.5, 0) direction (0, 0, 1) diameter 6.647 end through all thread major 8 thread length 15
hole "Hole21" at (22.5, -70.5, 0) direction (0, 0, 1) diameter 6.647 end through all thread major 8 thread length 15
hole "Hole22" at (67.5, -70.5, 0) direction (0, 0, 1) diameter 6.647 end through all thread major 8 thread length 15
hole "Hole23" at (67.5, -109.5, 0) direction (0, 0, 1) diameter 6.647 end through all thread major 8 thread length 15
properties part number "1983-1100-001" material "Acero, estructural"
